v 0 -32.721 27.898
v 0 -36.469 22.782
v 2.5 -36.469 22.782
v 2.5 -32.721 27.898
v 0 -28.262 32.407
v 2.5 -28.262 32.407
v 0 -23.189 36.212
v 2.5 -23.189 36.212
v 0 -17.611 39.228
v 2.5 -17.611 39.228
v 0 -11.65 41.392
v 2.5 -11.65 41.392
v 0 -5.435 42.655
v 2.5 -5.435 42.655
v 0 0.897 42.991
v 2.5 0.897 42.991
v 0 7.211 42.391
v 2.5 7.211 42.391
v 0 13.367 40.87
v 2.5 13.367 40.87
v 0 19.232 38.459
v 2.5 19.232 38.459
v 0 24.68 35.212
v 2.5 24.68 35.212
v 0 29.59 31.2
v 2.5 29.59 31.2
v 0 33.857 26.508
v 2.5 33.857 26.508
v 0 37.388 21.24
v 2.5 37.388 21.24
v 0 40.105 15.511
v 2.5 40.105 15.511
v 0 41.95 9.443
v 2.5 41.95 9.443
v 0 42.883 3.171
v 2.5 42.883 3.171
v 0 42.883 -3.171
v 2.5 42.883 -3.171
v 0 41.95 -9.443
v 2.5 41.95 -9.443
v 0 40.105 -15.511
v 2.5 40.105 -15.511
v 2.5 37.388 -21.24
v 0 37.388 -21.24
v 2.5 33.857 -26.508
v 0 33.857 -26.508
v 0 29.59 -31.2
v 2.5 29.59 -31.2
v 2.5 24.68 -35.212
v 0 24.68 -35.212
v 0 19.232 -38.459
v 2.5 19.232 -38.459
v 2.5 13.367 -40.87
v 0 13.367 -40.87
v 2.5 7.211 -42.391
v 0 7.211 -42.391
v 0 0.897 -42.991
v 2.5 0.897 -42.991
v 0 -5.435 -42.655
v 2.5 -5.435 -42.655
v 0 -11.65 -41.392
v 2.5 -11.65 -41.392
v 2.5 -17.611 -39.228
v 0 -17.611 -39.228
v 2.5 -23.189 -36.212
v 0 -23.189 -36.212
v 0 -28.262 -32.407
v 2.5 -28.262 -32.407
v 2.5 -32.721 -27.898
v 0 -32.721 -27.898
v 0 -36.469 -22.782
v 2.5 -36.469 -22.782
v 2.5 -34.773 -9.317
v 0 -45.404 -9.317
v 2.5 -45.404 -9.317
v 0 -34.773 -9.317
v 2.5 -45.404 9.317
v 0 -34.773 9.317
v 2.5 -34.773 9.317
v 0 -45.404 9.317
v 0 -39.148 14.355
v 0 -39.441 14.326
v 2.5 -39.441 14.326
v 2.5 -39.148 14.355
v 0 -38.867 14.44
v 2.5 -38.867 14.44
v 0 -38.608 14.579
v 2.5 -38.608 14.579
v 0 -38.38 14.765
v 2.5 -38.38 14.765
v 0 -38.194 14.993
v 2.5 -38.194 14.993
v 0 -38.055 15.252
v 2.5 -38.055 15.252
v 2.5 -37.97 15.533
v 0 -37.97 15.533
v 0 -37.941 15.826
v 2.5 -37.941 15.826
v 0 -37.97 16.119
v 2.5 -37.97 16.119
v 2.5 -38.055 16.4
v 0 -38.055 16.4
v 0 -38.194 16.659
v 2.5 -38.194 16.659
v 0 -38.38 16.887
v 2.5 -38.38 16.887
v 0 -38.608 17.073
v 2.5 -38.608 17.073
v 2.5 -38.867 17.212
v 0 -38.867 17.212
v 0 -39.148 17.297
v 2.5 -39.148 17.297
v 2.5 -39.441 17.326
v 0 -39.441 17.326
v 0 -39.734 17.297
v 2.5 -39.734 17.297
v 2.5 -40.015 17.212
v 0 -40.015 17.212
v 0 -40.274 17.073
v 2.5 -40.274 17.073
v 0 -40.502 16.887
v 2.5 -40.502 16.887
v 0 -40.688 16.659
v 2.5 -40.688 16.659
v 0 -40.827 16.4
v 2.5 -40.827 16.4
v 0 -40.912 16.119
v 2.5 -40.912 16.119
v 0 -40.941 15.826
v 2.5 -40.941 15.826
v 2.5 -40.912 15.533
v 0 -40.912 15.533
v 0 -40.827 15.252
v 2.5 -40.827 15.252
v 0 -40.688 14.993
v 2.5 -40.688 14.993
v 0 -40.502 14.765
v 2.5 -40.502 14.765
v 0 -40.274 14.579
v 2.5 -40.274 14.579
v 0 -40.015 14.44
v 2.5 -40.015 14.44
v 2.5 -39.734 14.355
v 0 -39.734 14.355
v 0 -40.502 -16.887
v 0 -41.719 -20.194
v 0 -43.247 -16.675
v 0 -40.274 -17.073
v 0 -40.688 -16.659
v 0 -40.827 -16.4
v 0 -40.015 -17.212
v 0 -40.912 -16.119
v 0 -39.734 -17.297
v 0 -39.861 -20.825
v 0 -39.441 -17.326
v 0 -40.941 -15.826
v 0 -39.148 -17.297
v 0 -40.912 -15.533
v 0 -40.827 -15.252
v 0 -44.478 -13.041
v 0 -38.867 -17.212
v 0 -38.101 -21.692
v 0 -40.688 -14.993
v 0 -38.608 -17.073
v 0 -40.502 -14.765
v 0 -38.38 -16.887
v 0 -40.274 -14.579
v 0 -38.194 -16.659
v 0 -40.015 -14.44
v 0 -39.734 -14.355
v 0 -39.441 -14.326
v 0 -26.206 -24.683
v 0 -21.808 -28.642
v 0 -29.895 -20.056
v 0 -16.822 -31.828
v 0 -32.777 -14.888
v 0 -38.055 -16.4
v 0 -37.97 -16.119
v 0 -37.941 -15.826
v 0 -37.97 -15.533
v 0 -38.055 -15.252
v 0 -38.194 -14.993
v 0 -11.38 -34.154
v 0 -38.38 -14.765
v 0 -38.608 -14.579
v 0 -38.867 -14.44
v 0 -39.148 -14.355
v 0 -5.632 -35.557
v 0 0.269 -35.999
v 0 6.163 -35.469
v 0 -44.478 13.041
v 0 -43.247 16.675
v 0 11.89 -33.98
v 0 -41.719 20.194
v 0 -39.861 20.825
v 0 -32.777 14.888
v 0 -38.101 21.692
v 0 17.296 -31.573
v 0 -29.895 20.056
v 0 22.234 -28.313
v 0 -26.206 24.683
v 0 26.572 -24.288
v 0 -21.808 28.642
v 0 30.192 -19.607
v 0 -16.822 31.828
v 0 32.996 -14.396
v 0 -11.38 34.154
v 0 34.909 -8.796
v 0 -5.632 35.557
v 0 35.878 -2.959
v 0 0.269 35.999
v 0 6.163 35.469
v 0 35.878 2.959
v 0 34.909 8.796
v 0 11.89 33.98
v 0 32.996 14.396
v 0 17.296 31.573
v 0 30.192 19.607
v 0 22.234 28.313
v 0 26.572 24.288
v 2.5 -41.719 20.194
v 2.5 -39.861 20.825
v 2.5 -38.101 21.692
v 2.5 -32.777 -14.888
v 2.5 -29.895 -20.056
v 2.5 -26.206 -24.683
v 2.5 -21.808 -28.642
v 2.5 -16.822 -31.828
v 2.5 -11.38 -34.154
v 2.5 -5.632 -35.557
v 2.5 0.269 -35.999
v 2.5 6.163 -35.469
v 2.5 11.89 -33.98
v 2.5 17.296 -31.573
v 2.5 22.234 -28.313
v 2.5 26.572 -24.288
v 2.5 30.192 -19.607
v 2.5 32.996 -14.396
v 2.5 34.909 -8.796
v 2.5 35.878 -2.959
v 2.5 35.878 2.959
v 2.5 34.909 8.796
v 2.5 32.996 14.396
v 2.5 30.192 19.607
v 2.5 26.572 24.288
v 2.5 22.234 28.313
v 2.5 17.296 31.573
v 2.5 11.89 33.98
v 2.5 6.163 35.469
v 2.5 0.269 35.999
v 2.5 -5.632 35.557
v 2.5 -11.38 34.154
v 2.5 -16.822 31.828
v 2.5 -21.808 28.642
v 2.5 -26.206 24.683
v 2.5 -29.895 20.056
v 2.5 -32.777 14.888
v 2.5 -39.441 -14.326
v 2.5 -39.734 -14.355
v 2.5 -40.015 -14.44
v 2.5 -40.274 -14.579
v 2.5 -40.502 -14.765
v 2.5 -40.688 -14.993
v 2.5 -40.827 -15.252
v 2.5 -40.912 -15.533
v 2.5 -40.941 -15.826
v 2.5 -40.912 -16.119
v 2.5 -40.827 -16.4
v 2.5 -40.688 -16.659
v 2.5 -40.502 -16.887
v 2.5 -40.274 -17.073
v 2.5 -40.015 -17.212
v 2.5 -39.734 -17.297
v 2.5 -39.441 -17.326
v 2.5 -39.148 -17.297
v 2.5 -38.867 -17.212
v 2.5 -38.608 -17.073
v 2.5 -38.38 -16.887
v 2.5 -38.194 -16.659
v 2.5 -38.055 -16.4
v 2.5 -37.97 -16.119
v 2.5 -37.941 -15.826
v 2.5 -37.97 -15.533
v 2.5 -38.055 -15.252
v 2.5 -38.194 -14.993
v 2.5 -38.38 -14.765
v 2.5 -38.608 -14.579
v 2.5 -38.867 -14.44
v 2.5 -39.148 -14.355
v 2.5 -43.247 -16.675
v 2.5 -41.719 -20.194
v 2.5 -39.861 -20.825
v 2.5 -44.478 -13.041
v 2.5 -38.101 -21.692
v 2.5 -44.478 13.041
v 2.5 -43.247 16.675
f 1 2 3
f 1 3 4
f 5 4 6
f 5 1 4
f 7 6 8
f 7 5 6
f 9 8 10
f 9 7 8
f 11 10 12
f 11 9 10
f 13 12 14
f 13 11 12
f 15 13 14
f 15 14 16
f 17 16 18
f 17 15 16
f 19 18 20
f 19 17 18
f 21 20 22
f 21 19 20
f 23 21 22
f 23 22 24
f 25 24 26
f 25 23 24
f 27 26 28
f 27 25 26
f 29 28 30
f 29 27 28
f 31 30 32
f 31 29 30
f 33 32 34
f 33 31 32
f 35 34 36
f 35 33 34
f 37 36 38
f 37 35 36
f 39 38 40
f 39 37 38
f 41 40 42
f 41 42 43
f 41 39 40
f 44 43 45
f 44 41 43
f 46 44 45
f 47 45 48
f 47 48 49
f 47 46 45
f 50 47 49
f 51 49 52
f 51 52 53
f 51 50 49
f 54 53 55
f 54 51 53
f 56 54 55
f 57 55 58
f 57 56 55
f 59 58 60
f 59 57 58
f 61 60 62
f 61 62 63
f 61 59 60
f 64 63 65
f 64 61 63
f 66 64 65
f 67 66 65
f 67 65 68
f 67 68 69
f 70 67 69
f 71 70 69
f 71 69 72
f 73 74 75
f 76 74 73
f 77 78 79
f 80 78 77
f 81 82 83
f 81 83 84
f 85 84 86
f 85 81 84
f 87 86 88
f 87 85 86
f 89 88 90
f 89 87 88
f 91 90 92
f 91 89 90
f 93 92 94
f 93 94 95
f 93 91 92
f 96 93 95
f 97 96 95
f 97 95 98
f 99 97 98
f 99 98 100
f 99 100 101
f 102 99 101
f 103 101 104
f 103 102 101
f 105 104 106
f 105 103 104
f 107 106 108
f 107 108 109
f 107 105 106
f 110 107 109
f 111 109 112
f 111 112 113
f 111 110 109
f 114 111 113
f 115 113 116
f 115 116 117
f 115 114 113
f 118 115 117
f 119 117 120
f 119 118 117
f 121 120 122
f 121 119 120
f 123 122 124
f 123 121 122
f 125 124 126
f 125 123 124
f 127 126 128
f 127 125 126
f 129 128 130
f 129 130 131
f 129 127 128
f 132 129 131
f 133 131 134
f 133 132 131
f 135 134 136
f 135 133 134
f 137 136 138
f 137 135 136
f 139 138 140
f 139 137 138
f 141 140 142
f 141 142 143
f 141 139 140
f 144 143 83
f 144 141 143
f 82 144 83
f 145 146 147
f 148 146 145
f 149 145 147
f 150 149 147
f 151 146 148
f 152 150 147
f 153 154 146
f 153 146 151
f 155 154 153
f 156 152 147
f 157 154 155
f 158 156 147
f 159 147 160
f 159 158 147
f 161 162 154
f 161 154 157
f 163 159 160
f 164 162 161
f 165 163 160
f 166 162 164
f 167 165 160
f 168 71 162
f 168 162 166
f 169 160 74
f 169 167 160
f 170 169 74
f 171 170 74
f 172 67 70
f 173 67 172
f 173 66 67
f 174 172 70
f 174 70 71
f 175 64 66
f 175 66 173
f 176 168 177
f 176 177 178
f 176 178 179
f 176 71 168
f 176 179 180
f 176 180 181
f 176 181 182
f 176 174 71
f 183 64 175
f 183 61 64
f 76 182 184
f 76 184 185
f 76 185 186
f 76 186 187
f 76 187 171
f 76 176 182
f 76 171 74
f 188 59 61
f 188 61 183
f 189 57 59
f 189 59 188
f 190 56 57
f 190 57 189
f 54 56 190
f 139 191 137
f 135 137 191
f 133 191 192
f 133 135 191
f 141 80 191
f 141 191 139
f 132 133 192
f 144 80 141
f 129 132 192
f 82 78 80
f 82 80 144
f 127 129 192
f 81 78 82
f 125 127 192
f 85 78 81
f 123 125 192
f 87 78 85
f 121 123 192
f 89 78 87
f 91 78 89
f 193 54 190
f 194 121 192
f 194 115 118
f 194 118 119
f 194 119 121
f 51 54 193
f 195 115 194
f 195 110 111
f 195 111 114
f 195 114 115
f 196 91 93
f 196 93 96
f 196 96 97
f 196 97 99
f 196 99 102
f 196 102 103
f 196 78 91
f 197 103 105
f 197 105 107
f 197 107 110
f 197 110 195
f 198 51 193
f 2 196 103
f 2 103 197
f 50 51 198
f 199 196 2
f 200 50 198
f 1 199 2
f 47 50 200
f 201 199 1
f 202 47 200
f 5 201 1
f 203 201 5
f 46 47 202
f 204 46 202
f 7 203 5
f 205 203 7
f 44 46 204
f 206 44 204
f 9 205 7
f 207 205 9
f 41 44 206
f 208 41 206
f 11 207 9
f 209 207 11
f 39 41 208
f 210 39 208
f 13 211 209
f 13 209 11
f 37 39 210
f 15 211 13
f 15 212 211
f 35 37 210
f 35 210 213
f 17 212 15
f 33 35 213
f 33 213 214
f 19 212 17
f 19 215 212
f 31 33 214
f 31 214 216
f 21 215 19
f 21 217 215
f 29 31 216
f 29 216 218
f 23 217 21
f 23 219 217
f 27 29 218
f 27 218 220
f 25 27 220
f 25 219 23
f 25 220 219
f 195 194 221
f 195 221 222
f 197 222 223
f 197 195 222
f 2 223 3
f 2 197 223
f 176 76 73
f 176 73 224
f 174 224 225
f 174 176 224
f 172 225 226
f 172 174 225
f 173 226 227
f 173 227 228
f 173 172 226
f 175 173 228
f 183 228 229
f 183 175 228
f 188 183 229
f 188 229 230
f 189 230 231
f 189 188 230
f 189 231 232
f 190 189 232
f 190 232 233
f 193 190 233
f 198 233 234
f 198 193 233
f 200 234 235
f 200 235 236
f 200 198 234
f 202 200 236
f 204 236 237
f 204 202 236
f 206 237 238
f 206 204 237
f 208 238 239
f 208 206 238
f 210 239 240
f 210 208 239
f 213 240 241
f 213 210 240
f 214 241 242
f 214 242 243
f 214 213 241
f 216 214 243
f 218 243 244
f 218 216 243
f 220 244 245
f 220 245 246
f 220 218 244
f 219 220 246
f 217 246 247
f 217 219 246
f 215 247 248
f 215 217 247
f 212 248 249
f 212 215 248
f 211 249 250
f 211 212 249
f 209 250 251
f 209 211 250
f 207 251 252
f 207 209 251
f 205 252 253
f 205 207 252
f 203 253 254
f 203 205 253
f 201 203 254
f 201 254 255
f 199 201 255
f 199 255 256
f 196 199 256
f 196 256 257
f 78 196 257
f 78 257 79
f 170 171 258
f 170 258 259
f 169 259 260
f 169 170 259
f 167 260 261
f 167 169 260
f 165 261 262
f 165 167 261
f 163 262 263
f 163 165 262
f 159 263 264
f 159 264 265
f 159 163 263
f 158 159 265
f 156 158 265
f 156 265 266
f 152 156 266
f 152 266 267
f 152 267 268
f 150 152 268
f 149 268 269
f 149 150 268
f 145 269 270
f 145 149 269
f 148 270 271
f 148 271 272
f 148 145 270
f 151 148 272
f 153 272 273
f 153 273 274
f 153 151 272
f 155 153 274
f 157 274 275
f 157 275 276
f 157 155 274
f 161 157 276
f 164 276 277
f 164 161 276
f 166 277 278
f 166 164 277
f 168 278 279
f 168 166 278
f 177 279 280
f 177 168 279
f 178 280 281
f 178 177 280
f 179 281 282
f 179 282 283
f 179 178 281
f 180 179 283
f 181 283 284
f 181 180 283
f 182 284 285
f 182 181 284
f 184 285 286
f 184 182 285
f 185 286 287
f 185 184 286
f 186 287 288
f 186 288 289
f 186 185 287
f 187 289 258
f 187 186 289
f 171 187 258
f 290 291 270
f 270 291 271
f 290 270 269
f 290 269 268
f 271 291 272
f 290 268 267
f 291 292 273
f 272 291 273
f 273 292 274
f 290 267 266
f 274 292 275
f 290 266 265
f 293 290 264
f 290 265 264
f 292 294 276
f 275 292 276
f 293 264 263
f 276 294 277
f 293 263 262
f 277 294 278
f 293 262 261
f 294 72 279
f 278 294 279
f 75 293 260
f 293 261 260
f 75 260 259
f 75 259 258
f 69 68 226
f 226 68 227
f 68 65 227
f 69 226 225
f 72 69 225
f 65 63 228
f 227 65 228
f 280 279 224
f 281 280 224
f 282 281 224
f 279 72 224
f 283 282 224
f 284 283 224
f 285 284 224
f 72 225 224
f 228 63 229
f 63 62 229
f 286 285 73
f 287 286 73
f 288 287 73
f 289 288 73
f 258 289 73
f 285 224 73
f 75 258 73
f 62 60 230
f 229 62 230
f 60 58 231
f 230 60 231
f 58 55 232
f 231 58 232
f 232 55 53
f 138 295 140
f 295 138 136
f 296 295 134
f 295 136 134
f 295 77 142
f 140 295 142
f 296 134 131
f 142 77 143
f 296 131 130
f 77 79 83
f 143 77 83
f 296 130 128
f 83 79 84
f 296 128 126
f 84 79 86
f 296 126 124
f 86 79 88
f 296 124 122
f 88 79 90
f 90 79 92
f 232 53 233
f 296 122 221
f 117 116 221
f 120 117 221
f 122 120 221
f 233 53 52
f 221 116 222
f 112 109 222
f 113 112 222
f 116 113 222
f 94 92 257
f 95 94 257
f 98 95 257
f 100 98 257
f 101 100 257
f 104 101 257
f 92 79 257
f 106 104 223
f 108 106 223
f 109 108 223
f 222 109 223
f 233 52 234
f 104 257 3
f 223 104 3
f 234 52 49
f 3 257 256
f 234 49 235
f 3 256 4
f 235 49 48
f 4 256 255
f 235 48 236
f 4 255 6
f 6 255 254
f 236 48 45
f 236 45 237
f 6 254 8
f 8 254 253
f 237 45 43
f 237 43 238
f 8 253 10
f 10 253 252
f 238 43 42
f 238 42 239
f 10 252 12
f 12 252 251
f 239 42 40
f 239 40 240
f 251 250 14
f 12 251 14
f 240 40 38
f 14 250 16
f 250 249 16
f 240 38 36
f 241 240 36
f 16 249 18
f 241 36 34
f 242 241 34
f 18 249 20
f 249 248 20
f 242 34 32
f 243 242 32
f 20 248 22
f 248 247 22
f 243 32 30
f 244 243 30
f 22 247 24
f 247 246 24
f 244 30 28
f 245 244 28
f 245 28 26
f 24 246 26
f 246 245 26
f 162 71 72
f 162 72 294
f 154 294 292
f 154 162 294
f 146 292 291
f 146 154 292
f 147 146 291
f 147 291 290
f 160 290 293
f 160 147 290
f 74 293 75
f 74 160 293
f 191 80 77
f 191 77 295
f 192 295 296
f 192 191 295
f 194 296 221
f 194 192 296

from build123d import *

# Parameters (mm, degrees)
ESQUISSE1_R        = 1.5
BOSS_EXTRU_1_DEPTH = 2.5


with BuildPart() as part:
    # Esquisse1 → Boss.-Extru.1 (new body)
    with BuildSketch(Plane(origin=(0, 0, 0), x_dir=(0, 0, -1), z_dir=(1, 0, 0))):
        with BuildLine():
            Line((-9.317485624, -34.773329746), (-9.317485624, -45.403821003))
            ThreePointArc((-9.317485624, -45.403821003), (-14.870482968, -43.89978629), (-20.194379814, -41.719414233))
            ThreePointArc((-20.194379814, -41.719414233), (-21.229656255, -38.966646831), (-22.782160988, -36.468796809))
            ThreePointArc((-22.782160988, -36.468796809), (0, 43), (22.782160988, -36.468796809))
            ThreePointArc((22.782160988, -36.468796809), (21.229656255, -38.966646831), (20.194379814, -41.719414233))
            ThreePointArc((20.194379814, -41.719414233), (14.870482968, -43.89978629), (9.317485624, -45.403821003))
            Line((9.317485624, -45.403821003), (9.317485624, -34.773329746))
            ThreePointArc((9.317485624, -34.773329746), (0, 36), (-9.317485624, -34.773329746))
        make_face()
        with Locations((-15.826054686, -39.441057647)):
            Circle(ESQUISSE1_R, mode=Mode.SUBTRACT)
        with Locations(Location((15.826054686, -39.441057647, 0), (0, 0, 180))):
            Circle(ESQUISSE1_R, mode=Mode.SUBTRACT)
    extrude(amount=BOSS_EXTRU_1_DEPTH)


solid = part.part
